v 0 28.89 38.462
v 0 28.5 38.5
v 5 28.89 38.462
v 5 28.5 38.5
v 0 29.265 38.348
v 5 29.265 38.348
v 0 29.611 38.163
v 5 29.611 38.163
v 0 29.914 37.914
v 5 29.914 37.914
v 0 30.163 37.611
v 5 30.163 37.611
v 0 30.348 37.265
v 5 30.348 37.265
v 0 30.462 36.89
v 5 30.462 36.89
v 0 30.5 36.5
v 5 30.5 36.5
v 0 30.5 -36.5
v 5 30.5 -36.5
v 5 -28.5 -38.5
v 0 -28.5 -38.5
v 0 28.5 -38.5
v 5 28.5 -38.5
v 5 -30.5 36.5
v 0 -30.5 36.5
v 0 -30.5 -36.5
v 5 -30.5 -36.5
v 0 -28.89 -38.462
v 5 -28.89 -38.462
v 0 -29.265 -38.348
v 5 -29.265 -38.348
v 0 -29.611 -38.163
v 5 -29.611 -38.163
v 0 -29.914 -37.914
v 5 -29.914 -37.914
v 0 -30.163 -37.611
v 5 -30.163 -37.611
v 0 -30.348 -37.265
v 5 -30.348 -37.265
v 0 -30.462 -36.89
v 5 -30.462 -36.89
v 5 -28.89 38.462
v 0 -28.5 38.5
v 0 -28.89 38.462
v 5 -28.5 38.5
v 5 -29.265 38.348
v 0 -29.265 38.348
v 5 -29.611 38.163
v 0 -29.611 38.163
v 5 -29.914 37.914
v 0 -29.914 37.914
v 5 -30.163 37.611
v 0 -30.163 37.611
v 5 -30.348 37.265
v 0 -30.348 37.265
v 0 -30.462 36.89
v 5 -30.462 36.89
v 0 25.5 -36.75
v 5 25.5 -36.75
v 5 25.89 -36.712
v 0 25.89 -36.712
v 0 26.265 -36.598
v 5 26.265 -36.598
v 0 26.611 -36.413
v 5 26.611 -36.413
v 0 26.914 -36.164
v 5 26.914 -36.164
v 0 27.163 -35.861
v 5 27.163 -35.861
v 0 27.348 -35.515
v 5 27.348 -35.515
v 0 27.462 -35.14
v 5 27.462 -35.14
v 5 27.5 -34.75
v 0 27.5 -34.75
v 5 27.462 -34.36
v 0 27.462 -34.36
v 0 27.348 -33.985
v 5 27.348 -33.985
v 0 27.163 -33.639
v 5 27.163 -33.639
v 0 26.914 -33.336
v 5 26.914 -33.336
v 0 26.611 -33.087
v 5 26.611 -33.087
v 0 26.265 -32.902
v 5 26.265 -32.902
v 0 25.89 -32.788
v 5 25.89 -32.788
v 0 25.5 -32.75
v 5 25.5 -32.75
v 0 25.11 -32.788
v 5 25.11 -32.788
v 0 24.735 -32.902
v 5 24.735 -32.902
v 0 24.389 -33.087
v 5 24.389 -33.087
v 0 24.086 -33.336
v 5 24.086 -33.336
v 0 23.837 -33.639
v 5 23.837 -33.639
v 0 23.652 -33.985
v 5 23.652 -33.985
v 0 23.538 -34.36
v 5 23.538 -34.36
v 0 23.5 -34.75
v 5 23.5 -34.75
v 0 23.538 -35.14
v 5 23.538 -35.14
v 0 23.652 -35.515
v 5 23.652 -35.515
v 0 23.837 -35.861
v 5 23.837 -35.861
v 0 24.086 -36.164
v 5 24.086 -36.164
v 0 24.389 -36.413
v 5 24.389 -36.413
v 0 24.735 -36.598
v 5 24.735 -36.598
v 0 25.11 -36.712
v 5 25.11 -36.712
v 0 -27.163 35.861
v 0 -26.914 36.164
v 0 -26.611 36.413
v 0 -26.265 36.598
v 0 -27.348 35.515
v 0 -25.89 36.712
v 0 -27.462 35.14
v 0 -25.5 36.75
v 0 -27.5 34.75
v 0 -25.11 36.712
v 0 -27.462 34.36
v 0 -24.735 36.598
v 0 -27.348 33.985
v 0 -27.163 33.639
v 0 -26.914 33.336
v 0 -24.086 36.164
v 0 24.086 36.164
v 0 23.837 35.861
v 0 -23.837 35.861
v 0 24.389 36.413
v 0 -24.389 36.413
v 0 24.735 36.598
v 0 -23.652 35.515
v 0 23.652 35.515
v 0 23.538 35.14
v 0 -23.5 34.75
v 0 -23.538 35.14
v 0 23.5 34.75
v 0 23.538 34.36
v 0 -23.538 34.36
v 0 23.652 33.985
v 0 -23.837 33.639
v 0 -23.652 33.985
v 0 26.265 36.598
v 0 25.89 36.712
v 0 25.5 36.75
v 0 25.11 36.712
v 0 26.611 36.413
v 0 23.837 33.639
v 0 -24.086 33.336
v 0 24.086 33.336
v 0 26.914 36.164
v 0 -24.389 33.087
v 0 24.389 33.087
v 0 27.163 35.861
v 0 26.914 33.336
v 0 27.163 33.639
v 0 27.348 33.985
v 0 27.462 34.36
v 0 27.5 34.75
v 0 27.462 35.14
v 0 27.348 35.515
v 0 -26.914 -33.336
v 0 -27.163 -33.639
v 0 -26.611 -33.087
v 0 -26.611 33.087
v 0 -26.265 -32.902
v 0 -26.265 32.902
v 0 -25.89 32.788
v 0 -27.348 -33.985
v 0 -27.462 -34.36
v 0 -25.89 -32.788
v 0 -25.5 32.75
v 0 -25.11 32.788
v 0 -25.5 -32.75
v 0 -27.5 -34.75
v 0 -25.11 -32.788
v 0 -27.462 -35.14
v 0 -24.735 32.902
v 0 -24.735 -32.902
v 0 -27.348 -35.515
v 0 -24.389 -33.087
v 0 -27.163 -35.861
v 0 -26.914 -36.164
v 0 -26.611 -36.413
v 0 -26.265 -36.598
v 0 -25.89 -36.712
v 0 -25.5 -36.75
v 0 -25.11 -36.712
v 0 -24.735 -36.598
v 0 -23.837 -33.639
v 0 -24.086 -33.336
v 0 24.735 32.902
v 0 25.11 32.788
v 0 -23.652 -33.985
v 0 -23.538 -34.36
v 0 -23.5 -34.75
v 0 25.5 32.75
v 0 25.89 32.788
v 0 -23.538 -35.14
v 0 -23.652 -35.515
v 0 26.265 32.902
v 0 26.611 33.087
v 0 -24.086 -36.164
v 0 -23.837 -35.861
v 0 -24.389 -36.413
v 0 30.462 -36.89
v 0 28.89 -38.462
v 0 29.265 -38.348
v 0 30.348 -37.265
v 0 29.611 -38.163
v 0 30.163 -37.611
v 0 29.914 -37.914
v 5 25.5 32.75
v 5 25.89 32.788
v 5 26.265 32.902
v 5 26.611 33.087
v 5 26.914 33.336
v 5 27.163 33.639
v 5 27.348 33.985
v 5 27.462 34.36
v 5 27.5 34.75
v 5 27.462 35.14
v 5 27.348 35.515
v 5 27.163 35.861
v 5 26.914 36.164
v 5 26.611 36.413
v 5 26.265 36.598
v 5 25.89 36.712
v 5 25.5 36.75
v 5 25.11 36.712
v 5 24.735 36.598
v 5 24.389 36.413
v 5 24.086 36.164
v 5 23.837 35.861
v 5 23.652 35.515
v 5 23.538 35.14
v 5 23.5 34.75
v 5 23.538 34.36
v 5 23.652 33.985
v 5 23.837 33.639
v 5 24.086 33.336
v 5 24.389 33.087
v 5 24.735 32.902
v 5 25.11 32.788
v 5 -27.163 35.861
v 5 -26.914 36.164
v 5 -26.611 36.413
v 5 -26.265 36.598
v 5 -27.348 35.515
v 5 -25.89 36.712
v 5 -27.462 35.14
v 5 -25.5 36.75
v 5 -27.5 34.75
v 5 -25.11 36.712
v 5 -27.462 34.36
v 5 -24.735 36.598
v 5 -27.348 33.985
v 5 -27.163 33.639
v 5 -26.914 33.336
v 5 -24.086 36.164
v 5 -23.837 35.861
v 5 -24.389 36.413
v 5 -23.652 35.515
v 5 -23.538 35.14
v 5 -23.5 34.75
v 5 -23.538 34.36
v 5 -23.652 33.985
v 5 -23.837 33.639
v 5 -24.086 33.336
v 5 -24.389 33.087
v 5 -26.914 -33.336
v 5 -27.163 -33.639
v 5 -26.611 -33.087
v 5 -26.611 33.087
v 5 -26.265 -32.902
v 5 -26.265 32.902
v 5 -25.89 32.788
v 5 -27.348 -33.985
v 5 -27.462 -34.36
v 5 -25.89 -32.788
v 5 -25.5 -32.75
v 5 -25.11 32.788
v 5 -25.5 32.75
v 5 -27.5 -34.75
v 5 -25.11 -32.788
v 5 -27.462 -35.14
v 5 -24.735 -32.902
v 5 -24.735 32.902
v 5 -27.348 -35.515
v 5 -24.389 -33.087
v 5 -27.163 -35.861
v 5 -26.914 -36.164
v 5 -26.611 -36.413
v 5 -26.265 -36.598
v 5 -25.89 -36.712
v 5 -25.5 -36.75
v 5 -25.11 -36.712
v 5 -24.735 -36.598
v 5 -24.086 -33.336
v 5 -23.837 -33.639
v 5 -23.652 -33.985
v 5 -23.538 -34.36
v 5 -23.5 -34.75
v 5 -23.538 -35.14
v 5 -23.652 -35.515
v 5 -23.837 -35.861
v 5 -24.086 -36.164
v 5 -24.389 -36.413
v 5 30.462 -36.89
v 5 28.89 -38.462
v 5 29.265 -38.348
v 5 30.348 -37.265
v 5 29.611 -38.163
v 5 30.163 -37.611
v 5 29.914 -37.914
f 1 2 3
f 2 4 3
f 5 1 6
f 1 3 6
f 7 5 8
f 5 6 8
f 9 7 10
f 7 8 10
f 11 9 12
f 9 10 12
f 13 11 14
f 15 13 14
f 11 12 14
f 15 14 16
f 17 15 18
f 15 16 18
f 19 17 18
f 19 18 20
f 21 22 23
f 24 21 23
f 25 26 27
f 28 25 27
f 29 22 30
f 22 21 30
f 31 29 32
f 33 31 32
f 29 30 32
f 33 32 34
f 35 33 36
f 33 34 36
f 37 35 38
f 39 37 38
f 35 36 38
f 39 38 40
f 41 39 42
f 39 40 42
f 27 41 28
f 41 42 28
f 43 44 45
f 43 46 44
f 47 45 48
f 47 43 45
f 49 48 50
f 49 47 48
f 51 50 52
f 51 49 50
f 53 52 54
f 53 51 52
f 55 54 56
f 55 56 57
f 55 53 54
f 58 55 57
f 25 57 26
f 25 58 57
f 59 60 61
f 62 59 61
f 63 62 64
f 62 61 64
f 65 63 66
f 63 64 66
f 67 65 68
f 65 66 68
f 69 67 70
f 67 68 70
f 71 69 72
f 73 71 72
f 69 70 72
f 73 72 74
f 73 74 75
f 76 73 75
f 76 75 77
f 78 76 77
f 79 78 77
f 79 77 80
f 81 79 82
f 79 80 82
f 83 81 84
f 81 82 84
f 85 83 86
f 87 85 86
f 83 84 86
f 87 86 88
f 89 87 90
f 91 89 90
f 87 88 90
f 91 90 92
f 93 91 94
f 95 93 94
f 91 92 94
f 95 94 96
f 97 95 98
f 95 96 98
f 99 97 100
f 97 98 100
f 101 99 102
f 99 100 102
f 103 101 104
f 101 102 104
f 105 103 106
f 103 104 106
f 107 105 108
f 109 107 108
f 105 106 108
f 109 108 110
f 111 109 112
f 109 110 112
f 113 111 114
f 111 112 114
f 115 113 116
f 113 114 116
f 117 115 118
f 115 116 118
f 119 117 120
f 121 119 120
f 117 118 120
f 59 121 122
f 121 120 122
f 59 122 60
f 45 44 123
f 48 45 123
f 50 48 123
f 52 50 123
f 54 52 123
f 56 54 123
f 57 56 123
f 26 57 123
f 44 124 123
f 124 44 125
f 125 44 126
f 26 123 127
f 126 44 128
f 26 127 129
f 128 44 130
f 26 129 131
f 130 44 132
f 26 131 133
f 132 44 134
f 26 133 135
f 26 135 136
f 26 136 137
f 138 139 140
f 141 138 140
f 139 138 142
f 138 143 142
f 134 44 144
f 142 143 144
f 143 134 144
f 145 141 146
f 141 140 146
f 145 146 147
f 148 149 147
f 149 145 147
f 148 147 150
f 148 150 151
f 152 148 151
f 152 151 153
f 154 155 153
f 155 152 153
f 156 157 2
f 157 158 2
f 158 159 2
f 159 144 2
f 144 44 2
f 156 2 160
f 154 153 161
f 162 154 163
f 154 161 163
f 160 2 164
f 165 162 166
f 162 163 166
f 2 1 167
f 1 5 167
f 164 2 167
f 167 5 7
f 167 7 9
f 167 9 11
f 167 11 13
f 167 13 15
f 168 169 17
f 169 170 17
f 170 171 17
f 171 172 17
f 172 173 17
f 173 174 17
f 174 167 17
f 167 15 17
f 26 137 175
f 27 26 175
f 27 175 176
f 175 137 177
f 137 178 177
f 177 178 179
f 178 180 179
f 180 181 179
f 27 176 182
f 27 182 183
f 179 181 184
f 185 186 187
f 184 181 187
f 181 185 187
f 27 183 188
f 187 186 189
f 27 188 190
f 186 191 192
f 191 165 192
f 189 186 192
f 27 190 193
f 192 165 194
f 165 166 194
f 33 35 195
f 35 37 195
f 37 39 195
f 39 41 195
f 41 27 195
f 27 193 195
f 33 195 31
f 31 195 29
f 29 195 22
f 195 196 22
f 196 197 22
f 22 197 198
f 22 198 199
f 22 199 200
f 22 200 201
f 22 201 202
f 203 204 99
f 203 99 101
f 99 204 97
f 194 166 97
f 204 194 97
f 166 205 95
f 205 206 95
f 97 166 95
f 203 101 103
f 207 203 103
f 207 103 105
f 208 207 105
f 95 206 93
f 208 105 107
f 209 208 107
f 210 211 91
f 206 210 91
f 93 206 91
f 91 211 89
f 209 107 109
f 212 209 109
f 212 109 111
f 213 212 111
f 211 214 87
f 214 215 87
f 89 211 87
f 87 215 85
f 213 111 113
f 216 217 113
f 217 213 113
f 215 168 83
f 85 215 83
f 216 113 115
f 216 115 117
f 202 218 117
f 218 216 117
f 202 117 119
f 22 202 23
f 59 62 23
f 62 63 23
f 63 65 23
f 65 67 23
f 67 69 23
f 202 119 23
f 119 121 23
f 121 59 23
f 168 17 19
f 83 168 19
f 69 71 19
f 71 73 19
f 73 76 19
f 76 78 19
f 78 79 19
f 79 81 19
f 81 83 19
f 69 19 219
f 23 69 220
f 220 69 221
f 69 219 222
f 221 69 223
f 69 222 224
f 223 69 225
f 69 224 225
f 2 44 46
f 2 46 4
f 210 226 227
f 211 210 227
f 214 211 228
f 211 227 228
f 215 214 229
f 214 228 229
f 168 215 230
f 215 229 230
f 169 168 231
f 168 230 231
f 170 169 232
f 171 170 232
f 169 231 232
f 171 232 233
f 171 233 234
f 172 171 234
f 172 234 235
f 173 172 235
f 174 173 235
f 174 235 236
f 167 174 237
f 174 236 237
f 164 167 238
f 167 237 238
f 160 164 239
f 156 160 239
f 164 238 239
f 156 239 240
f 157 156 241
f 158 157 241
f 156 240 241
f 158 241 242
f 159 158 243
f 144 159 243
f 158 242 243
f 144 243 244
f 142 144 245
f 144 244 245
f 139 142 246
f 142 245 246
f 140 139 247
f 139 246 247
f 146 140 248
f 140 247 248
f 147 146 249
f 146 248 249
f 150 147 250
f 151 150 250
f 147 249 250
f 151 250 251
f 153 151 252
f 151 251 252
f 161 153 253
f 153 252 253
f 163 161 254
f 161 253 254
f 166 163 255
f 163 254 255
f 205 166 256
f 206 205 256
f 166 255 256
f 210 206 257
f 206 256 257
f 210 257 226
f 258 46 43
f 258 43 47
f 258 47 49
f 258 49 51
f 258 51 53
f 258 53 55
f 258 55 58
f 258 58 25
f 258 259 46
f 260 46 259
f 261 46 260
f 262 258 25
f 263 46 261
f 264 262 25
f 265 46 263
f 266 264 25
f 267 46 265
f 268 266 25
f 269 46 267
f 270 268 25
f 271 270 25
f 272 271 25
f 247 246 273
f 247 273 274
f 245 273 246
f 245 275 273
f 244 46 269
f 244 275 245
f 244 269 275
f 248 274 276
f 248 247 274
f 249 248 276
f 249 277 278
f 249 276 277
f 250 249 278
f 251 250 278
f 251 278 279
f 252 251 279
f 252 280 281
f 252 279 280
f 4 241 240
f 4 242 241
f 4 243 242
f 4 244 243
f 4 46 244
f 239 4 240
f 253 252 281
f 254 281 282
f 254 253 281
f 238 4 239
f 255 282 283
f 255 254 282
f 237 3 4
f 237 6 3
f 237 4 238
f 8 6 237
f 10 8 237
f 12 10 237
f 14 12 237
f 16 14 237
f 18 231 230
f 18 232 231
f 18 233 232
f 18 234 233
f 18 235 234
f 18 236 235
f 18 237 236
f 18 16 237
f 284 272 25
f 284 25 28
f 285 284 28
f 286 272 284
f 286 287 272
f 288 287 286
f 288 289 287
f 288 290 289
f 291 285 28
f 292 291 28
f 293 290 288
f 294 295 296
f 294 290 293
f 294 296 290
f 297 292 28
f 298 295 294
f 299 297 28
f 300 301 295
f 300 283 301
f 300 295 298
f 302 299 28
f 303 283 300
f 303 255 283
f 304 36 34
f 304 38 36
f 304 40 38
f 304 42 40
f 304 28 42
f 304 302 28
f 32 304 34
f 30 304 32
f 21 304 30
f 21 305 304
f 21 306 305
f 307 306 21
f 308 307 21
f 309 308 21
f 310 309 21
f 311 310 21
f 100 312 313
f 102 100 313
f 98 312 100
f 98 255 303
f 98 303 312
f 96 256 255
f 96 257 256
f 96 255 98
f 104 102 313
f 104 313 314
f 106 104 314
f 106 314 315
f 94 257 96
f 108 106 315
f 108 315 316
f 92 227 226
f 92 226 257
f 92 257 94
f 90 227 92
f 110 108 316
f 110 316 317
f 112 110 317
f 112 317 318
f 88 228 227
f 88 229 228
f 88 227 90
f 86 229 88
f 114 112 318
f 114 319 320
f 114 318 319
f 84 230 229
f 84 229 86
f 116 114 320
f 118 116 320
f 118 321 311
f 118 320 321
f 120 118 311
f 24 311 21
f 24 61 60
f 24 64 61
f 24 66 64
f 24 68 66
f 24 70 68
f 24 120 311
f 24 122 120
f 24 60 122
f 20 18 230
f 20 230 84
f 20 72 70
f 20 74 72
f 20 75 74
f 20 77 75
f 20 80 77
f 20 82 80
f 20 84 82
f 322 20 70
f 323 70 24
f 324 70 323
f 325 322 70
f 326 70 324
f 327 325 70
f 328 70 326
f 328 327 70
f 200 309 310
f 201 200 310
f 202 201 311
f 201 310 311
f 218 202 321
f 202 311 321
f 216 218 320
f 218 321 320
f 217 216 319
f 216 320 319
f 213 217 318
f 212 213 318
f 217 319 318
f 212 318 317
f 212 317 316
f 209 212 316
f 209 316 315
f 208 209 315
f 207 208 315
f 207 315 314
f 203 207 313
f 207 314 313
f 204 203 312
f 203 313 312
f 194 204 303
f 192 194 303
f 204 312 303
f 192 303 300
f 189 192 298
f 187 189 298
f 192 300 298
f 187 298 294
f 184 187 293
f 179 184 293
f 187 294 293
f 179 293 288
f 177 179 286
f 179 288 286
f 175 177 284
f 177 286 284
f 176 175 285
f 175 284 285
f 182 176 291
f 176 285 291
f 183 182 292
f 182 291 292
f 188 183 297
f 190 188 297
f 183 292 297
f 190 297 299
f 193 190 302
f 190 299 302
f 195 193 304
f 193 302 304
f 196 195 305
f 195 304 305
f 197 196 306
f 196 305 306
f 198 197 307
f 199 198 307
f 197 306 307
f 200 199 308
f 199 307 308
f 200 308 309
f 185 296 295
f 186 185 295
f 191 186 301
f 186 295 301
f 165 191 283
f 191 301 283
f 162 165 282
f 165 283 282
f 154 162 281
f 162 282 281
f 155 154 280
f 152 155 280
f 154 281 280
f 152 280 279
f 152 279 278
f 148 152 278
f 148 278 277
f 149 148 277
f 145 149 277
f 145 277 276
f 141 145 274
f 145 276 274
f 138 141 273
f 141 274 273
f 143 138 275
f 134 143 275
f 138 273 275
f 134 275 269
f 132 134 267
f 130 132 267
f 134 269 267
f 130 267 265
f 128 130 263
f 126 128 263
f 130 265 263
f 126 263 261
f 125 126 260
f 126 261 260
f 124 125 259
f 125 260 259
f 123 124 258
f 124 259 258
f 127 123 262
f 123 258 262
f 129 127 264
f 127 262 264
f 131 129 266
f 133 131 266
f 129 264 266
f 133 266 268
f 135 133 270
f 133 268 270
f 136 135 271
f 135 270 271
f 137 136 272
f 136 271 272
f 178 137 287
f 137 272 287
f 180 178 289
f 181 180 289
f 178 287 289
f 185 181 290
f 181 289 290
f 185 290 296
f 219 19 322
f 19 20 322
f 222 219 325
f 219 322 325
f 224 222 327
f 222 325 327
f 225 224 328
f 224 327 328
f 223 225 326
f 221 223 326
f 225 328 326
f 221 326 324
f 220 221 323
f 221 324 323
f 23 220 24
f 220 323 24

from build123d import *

# Parameters (mm, degrees)
CROQUIS1_W              = 77
CROQUIS1_H              = 61
SALIENTE_EXTRUIR1_DEPTH = 5
CROQUIS2_R              = 2
CORTAR_EXTRUIR1_DEPTH   = 5
REDONDEO2_R             = 2
REDONDEO3_R             = 2
REDONDEO4_R             = 2


with BuildPart() as part:
    # Croquis1 → Saliente-Extruir1 (new body)
    with BuildSketch(Plane(origin=(0, 0, 0), x_dir=(0, 0, -1), z_dir=(1, 0, 0))):
        Rectangle(CROQUIS1_W, CROQUIS1_H)
    extrude(amount=SALIENTE_EXTRUIR1_DEPTH)

    # Croquis2 → Cortar-Extruir1 (cut)
    with BuildSketch(Plane(origin=(5, 0, 0), x_dir=(0, 0, -1), z_dir=(1, 0, 0))):
        with Locations((-34.75, 25.5)):
            Circle(CROQUIS2_R)
        with Locations((-34.75, -25.5)):
            Circle(CROQUIS2_R)
        with Locations((34.75, 25.5)):
            Circle(CROQUIS2_R)
        with Locations((34.75, -25.5)):
            Circle(CROQUIS2_R)
    extrude(amount=-CORTAR_EXTRUIR1_DEPTH, mode=Mode.SUBTRACT)

    # Redondeo2
    redondeo2_edges = [part.edges().sort_by_distance(p)[0] for p in [
        (2.5, 30.5, 38.5),
    ]]
    fillet(redondeo2_edges, radius=REDONDEO2_R)

    # Redondeo3
    redondeo3_edges = [part.edges().sort_by_distance(p)[0] for p in [
        (2.5, 30.5, -38.5),
    ]]
    fillet(redondeo3_edges, radius=REDONDEO3_R)

    # Redondeo4
    redondeo4_edges = [part.edges().sort_by_distance(p)[0] for p in [
        (2.5, -30.5, -38.5),
        (2.5, -30.5, 38.5),
    ]]
    fillet(redondeo4_edges, radius=REDONDEO4_R)


solid = part.part
